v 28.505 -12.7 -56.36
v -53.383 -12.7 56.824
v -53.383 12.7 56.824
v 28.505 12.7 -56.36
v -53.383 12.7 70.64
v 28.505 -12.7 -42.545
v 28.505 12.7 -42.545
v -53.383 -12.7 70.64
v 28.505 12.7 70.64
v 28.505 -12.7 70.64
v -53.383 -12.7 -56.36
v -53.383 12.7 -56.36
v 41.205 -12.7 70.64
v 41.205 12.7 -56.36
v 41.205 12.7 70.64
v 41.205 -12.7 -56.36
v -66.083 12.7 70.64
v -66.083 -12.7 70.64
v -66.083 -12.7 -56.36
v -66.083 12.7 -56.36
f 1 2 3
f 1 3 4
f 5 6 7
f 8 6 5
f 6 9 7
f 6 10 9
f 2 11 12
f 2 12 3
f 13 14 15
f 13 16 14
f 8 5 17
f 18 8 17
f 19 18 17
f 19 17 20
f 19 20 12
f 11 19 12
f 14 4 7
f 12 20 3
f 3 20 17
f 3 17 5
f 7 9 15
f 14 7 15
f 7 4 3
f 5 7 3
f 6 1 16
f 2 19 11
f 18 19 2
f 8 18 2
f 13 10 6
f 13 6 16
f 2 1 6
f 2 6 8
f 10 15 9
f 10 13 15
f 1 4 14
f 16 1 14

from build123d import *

# Parameters (mm, degrees)
F1_DEPTH = 12.7
F2_DEPTH = 12.7


with BuildPart() as f1:
    # F0 (on Front) → F1 (new body, symmetric)
    with BuildSketch(Plane.XZ):
        Polygon((28.504521, 70.64042), (28.504521, -42.545328), (38.498788, -56.35958), (41.204521, -56.35958), (41.204521, 70.64042), align=None)
    extrude(amount=F1_DEPTH, both=True)

    # F0 (on Front) → F2 (join, symmetric)
    with BuildSketch(Plane.XZ):
        Polygon((-53.38255, 70.64042), (-66.08255, 70.64042), (-66.08255, -56.35958), (-53.38255, -56.35958), (-53.38255, -0.88598), (-53.38255, 56.82433), (28.504521, -56.35958), (38.498788, -56.35958), (28.504521, -42.545328), align=None)
    extrude(amount=F2_DEPTH, both=True)


solid = f1.part
